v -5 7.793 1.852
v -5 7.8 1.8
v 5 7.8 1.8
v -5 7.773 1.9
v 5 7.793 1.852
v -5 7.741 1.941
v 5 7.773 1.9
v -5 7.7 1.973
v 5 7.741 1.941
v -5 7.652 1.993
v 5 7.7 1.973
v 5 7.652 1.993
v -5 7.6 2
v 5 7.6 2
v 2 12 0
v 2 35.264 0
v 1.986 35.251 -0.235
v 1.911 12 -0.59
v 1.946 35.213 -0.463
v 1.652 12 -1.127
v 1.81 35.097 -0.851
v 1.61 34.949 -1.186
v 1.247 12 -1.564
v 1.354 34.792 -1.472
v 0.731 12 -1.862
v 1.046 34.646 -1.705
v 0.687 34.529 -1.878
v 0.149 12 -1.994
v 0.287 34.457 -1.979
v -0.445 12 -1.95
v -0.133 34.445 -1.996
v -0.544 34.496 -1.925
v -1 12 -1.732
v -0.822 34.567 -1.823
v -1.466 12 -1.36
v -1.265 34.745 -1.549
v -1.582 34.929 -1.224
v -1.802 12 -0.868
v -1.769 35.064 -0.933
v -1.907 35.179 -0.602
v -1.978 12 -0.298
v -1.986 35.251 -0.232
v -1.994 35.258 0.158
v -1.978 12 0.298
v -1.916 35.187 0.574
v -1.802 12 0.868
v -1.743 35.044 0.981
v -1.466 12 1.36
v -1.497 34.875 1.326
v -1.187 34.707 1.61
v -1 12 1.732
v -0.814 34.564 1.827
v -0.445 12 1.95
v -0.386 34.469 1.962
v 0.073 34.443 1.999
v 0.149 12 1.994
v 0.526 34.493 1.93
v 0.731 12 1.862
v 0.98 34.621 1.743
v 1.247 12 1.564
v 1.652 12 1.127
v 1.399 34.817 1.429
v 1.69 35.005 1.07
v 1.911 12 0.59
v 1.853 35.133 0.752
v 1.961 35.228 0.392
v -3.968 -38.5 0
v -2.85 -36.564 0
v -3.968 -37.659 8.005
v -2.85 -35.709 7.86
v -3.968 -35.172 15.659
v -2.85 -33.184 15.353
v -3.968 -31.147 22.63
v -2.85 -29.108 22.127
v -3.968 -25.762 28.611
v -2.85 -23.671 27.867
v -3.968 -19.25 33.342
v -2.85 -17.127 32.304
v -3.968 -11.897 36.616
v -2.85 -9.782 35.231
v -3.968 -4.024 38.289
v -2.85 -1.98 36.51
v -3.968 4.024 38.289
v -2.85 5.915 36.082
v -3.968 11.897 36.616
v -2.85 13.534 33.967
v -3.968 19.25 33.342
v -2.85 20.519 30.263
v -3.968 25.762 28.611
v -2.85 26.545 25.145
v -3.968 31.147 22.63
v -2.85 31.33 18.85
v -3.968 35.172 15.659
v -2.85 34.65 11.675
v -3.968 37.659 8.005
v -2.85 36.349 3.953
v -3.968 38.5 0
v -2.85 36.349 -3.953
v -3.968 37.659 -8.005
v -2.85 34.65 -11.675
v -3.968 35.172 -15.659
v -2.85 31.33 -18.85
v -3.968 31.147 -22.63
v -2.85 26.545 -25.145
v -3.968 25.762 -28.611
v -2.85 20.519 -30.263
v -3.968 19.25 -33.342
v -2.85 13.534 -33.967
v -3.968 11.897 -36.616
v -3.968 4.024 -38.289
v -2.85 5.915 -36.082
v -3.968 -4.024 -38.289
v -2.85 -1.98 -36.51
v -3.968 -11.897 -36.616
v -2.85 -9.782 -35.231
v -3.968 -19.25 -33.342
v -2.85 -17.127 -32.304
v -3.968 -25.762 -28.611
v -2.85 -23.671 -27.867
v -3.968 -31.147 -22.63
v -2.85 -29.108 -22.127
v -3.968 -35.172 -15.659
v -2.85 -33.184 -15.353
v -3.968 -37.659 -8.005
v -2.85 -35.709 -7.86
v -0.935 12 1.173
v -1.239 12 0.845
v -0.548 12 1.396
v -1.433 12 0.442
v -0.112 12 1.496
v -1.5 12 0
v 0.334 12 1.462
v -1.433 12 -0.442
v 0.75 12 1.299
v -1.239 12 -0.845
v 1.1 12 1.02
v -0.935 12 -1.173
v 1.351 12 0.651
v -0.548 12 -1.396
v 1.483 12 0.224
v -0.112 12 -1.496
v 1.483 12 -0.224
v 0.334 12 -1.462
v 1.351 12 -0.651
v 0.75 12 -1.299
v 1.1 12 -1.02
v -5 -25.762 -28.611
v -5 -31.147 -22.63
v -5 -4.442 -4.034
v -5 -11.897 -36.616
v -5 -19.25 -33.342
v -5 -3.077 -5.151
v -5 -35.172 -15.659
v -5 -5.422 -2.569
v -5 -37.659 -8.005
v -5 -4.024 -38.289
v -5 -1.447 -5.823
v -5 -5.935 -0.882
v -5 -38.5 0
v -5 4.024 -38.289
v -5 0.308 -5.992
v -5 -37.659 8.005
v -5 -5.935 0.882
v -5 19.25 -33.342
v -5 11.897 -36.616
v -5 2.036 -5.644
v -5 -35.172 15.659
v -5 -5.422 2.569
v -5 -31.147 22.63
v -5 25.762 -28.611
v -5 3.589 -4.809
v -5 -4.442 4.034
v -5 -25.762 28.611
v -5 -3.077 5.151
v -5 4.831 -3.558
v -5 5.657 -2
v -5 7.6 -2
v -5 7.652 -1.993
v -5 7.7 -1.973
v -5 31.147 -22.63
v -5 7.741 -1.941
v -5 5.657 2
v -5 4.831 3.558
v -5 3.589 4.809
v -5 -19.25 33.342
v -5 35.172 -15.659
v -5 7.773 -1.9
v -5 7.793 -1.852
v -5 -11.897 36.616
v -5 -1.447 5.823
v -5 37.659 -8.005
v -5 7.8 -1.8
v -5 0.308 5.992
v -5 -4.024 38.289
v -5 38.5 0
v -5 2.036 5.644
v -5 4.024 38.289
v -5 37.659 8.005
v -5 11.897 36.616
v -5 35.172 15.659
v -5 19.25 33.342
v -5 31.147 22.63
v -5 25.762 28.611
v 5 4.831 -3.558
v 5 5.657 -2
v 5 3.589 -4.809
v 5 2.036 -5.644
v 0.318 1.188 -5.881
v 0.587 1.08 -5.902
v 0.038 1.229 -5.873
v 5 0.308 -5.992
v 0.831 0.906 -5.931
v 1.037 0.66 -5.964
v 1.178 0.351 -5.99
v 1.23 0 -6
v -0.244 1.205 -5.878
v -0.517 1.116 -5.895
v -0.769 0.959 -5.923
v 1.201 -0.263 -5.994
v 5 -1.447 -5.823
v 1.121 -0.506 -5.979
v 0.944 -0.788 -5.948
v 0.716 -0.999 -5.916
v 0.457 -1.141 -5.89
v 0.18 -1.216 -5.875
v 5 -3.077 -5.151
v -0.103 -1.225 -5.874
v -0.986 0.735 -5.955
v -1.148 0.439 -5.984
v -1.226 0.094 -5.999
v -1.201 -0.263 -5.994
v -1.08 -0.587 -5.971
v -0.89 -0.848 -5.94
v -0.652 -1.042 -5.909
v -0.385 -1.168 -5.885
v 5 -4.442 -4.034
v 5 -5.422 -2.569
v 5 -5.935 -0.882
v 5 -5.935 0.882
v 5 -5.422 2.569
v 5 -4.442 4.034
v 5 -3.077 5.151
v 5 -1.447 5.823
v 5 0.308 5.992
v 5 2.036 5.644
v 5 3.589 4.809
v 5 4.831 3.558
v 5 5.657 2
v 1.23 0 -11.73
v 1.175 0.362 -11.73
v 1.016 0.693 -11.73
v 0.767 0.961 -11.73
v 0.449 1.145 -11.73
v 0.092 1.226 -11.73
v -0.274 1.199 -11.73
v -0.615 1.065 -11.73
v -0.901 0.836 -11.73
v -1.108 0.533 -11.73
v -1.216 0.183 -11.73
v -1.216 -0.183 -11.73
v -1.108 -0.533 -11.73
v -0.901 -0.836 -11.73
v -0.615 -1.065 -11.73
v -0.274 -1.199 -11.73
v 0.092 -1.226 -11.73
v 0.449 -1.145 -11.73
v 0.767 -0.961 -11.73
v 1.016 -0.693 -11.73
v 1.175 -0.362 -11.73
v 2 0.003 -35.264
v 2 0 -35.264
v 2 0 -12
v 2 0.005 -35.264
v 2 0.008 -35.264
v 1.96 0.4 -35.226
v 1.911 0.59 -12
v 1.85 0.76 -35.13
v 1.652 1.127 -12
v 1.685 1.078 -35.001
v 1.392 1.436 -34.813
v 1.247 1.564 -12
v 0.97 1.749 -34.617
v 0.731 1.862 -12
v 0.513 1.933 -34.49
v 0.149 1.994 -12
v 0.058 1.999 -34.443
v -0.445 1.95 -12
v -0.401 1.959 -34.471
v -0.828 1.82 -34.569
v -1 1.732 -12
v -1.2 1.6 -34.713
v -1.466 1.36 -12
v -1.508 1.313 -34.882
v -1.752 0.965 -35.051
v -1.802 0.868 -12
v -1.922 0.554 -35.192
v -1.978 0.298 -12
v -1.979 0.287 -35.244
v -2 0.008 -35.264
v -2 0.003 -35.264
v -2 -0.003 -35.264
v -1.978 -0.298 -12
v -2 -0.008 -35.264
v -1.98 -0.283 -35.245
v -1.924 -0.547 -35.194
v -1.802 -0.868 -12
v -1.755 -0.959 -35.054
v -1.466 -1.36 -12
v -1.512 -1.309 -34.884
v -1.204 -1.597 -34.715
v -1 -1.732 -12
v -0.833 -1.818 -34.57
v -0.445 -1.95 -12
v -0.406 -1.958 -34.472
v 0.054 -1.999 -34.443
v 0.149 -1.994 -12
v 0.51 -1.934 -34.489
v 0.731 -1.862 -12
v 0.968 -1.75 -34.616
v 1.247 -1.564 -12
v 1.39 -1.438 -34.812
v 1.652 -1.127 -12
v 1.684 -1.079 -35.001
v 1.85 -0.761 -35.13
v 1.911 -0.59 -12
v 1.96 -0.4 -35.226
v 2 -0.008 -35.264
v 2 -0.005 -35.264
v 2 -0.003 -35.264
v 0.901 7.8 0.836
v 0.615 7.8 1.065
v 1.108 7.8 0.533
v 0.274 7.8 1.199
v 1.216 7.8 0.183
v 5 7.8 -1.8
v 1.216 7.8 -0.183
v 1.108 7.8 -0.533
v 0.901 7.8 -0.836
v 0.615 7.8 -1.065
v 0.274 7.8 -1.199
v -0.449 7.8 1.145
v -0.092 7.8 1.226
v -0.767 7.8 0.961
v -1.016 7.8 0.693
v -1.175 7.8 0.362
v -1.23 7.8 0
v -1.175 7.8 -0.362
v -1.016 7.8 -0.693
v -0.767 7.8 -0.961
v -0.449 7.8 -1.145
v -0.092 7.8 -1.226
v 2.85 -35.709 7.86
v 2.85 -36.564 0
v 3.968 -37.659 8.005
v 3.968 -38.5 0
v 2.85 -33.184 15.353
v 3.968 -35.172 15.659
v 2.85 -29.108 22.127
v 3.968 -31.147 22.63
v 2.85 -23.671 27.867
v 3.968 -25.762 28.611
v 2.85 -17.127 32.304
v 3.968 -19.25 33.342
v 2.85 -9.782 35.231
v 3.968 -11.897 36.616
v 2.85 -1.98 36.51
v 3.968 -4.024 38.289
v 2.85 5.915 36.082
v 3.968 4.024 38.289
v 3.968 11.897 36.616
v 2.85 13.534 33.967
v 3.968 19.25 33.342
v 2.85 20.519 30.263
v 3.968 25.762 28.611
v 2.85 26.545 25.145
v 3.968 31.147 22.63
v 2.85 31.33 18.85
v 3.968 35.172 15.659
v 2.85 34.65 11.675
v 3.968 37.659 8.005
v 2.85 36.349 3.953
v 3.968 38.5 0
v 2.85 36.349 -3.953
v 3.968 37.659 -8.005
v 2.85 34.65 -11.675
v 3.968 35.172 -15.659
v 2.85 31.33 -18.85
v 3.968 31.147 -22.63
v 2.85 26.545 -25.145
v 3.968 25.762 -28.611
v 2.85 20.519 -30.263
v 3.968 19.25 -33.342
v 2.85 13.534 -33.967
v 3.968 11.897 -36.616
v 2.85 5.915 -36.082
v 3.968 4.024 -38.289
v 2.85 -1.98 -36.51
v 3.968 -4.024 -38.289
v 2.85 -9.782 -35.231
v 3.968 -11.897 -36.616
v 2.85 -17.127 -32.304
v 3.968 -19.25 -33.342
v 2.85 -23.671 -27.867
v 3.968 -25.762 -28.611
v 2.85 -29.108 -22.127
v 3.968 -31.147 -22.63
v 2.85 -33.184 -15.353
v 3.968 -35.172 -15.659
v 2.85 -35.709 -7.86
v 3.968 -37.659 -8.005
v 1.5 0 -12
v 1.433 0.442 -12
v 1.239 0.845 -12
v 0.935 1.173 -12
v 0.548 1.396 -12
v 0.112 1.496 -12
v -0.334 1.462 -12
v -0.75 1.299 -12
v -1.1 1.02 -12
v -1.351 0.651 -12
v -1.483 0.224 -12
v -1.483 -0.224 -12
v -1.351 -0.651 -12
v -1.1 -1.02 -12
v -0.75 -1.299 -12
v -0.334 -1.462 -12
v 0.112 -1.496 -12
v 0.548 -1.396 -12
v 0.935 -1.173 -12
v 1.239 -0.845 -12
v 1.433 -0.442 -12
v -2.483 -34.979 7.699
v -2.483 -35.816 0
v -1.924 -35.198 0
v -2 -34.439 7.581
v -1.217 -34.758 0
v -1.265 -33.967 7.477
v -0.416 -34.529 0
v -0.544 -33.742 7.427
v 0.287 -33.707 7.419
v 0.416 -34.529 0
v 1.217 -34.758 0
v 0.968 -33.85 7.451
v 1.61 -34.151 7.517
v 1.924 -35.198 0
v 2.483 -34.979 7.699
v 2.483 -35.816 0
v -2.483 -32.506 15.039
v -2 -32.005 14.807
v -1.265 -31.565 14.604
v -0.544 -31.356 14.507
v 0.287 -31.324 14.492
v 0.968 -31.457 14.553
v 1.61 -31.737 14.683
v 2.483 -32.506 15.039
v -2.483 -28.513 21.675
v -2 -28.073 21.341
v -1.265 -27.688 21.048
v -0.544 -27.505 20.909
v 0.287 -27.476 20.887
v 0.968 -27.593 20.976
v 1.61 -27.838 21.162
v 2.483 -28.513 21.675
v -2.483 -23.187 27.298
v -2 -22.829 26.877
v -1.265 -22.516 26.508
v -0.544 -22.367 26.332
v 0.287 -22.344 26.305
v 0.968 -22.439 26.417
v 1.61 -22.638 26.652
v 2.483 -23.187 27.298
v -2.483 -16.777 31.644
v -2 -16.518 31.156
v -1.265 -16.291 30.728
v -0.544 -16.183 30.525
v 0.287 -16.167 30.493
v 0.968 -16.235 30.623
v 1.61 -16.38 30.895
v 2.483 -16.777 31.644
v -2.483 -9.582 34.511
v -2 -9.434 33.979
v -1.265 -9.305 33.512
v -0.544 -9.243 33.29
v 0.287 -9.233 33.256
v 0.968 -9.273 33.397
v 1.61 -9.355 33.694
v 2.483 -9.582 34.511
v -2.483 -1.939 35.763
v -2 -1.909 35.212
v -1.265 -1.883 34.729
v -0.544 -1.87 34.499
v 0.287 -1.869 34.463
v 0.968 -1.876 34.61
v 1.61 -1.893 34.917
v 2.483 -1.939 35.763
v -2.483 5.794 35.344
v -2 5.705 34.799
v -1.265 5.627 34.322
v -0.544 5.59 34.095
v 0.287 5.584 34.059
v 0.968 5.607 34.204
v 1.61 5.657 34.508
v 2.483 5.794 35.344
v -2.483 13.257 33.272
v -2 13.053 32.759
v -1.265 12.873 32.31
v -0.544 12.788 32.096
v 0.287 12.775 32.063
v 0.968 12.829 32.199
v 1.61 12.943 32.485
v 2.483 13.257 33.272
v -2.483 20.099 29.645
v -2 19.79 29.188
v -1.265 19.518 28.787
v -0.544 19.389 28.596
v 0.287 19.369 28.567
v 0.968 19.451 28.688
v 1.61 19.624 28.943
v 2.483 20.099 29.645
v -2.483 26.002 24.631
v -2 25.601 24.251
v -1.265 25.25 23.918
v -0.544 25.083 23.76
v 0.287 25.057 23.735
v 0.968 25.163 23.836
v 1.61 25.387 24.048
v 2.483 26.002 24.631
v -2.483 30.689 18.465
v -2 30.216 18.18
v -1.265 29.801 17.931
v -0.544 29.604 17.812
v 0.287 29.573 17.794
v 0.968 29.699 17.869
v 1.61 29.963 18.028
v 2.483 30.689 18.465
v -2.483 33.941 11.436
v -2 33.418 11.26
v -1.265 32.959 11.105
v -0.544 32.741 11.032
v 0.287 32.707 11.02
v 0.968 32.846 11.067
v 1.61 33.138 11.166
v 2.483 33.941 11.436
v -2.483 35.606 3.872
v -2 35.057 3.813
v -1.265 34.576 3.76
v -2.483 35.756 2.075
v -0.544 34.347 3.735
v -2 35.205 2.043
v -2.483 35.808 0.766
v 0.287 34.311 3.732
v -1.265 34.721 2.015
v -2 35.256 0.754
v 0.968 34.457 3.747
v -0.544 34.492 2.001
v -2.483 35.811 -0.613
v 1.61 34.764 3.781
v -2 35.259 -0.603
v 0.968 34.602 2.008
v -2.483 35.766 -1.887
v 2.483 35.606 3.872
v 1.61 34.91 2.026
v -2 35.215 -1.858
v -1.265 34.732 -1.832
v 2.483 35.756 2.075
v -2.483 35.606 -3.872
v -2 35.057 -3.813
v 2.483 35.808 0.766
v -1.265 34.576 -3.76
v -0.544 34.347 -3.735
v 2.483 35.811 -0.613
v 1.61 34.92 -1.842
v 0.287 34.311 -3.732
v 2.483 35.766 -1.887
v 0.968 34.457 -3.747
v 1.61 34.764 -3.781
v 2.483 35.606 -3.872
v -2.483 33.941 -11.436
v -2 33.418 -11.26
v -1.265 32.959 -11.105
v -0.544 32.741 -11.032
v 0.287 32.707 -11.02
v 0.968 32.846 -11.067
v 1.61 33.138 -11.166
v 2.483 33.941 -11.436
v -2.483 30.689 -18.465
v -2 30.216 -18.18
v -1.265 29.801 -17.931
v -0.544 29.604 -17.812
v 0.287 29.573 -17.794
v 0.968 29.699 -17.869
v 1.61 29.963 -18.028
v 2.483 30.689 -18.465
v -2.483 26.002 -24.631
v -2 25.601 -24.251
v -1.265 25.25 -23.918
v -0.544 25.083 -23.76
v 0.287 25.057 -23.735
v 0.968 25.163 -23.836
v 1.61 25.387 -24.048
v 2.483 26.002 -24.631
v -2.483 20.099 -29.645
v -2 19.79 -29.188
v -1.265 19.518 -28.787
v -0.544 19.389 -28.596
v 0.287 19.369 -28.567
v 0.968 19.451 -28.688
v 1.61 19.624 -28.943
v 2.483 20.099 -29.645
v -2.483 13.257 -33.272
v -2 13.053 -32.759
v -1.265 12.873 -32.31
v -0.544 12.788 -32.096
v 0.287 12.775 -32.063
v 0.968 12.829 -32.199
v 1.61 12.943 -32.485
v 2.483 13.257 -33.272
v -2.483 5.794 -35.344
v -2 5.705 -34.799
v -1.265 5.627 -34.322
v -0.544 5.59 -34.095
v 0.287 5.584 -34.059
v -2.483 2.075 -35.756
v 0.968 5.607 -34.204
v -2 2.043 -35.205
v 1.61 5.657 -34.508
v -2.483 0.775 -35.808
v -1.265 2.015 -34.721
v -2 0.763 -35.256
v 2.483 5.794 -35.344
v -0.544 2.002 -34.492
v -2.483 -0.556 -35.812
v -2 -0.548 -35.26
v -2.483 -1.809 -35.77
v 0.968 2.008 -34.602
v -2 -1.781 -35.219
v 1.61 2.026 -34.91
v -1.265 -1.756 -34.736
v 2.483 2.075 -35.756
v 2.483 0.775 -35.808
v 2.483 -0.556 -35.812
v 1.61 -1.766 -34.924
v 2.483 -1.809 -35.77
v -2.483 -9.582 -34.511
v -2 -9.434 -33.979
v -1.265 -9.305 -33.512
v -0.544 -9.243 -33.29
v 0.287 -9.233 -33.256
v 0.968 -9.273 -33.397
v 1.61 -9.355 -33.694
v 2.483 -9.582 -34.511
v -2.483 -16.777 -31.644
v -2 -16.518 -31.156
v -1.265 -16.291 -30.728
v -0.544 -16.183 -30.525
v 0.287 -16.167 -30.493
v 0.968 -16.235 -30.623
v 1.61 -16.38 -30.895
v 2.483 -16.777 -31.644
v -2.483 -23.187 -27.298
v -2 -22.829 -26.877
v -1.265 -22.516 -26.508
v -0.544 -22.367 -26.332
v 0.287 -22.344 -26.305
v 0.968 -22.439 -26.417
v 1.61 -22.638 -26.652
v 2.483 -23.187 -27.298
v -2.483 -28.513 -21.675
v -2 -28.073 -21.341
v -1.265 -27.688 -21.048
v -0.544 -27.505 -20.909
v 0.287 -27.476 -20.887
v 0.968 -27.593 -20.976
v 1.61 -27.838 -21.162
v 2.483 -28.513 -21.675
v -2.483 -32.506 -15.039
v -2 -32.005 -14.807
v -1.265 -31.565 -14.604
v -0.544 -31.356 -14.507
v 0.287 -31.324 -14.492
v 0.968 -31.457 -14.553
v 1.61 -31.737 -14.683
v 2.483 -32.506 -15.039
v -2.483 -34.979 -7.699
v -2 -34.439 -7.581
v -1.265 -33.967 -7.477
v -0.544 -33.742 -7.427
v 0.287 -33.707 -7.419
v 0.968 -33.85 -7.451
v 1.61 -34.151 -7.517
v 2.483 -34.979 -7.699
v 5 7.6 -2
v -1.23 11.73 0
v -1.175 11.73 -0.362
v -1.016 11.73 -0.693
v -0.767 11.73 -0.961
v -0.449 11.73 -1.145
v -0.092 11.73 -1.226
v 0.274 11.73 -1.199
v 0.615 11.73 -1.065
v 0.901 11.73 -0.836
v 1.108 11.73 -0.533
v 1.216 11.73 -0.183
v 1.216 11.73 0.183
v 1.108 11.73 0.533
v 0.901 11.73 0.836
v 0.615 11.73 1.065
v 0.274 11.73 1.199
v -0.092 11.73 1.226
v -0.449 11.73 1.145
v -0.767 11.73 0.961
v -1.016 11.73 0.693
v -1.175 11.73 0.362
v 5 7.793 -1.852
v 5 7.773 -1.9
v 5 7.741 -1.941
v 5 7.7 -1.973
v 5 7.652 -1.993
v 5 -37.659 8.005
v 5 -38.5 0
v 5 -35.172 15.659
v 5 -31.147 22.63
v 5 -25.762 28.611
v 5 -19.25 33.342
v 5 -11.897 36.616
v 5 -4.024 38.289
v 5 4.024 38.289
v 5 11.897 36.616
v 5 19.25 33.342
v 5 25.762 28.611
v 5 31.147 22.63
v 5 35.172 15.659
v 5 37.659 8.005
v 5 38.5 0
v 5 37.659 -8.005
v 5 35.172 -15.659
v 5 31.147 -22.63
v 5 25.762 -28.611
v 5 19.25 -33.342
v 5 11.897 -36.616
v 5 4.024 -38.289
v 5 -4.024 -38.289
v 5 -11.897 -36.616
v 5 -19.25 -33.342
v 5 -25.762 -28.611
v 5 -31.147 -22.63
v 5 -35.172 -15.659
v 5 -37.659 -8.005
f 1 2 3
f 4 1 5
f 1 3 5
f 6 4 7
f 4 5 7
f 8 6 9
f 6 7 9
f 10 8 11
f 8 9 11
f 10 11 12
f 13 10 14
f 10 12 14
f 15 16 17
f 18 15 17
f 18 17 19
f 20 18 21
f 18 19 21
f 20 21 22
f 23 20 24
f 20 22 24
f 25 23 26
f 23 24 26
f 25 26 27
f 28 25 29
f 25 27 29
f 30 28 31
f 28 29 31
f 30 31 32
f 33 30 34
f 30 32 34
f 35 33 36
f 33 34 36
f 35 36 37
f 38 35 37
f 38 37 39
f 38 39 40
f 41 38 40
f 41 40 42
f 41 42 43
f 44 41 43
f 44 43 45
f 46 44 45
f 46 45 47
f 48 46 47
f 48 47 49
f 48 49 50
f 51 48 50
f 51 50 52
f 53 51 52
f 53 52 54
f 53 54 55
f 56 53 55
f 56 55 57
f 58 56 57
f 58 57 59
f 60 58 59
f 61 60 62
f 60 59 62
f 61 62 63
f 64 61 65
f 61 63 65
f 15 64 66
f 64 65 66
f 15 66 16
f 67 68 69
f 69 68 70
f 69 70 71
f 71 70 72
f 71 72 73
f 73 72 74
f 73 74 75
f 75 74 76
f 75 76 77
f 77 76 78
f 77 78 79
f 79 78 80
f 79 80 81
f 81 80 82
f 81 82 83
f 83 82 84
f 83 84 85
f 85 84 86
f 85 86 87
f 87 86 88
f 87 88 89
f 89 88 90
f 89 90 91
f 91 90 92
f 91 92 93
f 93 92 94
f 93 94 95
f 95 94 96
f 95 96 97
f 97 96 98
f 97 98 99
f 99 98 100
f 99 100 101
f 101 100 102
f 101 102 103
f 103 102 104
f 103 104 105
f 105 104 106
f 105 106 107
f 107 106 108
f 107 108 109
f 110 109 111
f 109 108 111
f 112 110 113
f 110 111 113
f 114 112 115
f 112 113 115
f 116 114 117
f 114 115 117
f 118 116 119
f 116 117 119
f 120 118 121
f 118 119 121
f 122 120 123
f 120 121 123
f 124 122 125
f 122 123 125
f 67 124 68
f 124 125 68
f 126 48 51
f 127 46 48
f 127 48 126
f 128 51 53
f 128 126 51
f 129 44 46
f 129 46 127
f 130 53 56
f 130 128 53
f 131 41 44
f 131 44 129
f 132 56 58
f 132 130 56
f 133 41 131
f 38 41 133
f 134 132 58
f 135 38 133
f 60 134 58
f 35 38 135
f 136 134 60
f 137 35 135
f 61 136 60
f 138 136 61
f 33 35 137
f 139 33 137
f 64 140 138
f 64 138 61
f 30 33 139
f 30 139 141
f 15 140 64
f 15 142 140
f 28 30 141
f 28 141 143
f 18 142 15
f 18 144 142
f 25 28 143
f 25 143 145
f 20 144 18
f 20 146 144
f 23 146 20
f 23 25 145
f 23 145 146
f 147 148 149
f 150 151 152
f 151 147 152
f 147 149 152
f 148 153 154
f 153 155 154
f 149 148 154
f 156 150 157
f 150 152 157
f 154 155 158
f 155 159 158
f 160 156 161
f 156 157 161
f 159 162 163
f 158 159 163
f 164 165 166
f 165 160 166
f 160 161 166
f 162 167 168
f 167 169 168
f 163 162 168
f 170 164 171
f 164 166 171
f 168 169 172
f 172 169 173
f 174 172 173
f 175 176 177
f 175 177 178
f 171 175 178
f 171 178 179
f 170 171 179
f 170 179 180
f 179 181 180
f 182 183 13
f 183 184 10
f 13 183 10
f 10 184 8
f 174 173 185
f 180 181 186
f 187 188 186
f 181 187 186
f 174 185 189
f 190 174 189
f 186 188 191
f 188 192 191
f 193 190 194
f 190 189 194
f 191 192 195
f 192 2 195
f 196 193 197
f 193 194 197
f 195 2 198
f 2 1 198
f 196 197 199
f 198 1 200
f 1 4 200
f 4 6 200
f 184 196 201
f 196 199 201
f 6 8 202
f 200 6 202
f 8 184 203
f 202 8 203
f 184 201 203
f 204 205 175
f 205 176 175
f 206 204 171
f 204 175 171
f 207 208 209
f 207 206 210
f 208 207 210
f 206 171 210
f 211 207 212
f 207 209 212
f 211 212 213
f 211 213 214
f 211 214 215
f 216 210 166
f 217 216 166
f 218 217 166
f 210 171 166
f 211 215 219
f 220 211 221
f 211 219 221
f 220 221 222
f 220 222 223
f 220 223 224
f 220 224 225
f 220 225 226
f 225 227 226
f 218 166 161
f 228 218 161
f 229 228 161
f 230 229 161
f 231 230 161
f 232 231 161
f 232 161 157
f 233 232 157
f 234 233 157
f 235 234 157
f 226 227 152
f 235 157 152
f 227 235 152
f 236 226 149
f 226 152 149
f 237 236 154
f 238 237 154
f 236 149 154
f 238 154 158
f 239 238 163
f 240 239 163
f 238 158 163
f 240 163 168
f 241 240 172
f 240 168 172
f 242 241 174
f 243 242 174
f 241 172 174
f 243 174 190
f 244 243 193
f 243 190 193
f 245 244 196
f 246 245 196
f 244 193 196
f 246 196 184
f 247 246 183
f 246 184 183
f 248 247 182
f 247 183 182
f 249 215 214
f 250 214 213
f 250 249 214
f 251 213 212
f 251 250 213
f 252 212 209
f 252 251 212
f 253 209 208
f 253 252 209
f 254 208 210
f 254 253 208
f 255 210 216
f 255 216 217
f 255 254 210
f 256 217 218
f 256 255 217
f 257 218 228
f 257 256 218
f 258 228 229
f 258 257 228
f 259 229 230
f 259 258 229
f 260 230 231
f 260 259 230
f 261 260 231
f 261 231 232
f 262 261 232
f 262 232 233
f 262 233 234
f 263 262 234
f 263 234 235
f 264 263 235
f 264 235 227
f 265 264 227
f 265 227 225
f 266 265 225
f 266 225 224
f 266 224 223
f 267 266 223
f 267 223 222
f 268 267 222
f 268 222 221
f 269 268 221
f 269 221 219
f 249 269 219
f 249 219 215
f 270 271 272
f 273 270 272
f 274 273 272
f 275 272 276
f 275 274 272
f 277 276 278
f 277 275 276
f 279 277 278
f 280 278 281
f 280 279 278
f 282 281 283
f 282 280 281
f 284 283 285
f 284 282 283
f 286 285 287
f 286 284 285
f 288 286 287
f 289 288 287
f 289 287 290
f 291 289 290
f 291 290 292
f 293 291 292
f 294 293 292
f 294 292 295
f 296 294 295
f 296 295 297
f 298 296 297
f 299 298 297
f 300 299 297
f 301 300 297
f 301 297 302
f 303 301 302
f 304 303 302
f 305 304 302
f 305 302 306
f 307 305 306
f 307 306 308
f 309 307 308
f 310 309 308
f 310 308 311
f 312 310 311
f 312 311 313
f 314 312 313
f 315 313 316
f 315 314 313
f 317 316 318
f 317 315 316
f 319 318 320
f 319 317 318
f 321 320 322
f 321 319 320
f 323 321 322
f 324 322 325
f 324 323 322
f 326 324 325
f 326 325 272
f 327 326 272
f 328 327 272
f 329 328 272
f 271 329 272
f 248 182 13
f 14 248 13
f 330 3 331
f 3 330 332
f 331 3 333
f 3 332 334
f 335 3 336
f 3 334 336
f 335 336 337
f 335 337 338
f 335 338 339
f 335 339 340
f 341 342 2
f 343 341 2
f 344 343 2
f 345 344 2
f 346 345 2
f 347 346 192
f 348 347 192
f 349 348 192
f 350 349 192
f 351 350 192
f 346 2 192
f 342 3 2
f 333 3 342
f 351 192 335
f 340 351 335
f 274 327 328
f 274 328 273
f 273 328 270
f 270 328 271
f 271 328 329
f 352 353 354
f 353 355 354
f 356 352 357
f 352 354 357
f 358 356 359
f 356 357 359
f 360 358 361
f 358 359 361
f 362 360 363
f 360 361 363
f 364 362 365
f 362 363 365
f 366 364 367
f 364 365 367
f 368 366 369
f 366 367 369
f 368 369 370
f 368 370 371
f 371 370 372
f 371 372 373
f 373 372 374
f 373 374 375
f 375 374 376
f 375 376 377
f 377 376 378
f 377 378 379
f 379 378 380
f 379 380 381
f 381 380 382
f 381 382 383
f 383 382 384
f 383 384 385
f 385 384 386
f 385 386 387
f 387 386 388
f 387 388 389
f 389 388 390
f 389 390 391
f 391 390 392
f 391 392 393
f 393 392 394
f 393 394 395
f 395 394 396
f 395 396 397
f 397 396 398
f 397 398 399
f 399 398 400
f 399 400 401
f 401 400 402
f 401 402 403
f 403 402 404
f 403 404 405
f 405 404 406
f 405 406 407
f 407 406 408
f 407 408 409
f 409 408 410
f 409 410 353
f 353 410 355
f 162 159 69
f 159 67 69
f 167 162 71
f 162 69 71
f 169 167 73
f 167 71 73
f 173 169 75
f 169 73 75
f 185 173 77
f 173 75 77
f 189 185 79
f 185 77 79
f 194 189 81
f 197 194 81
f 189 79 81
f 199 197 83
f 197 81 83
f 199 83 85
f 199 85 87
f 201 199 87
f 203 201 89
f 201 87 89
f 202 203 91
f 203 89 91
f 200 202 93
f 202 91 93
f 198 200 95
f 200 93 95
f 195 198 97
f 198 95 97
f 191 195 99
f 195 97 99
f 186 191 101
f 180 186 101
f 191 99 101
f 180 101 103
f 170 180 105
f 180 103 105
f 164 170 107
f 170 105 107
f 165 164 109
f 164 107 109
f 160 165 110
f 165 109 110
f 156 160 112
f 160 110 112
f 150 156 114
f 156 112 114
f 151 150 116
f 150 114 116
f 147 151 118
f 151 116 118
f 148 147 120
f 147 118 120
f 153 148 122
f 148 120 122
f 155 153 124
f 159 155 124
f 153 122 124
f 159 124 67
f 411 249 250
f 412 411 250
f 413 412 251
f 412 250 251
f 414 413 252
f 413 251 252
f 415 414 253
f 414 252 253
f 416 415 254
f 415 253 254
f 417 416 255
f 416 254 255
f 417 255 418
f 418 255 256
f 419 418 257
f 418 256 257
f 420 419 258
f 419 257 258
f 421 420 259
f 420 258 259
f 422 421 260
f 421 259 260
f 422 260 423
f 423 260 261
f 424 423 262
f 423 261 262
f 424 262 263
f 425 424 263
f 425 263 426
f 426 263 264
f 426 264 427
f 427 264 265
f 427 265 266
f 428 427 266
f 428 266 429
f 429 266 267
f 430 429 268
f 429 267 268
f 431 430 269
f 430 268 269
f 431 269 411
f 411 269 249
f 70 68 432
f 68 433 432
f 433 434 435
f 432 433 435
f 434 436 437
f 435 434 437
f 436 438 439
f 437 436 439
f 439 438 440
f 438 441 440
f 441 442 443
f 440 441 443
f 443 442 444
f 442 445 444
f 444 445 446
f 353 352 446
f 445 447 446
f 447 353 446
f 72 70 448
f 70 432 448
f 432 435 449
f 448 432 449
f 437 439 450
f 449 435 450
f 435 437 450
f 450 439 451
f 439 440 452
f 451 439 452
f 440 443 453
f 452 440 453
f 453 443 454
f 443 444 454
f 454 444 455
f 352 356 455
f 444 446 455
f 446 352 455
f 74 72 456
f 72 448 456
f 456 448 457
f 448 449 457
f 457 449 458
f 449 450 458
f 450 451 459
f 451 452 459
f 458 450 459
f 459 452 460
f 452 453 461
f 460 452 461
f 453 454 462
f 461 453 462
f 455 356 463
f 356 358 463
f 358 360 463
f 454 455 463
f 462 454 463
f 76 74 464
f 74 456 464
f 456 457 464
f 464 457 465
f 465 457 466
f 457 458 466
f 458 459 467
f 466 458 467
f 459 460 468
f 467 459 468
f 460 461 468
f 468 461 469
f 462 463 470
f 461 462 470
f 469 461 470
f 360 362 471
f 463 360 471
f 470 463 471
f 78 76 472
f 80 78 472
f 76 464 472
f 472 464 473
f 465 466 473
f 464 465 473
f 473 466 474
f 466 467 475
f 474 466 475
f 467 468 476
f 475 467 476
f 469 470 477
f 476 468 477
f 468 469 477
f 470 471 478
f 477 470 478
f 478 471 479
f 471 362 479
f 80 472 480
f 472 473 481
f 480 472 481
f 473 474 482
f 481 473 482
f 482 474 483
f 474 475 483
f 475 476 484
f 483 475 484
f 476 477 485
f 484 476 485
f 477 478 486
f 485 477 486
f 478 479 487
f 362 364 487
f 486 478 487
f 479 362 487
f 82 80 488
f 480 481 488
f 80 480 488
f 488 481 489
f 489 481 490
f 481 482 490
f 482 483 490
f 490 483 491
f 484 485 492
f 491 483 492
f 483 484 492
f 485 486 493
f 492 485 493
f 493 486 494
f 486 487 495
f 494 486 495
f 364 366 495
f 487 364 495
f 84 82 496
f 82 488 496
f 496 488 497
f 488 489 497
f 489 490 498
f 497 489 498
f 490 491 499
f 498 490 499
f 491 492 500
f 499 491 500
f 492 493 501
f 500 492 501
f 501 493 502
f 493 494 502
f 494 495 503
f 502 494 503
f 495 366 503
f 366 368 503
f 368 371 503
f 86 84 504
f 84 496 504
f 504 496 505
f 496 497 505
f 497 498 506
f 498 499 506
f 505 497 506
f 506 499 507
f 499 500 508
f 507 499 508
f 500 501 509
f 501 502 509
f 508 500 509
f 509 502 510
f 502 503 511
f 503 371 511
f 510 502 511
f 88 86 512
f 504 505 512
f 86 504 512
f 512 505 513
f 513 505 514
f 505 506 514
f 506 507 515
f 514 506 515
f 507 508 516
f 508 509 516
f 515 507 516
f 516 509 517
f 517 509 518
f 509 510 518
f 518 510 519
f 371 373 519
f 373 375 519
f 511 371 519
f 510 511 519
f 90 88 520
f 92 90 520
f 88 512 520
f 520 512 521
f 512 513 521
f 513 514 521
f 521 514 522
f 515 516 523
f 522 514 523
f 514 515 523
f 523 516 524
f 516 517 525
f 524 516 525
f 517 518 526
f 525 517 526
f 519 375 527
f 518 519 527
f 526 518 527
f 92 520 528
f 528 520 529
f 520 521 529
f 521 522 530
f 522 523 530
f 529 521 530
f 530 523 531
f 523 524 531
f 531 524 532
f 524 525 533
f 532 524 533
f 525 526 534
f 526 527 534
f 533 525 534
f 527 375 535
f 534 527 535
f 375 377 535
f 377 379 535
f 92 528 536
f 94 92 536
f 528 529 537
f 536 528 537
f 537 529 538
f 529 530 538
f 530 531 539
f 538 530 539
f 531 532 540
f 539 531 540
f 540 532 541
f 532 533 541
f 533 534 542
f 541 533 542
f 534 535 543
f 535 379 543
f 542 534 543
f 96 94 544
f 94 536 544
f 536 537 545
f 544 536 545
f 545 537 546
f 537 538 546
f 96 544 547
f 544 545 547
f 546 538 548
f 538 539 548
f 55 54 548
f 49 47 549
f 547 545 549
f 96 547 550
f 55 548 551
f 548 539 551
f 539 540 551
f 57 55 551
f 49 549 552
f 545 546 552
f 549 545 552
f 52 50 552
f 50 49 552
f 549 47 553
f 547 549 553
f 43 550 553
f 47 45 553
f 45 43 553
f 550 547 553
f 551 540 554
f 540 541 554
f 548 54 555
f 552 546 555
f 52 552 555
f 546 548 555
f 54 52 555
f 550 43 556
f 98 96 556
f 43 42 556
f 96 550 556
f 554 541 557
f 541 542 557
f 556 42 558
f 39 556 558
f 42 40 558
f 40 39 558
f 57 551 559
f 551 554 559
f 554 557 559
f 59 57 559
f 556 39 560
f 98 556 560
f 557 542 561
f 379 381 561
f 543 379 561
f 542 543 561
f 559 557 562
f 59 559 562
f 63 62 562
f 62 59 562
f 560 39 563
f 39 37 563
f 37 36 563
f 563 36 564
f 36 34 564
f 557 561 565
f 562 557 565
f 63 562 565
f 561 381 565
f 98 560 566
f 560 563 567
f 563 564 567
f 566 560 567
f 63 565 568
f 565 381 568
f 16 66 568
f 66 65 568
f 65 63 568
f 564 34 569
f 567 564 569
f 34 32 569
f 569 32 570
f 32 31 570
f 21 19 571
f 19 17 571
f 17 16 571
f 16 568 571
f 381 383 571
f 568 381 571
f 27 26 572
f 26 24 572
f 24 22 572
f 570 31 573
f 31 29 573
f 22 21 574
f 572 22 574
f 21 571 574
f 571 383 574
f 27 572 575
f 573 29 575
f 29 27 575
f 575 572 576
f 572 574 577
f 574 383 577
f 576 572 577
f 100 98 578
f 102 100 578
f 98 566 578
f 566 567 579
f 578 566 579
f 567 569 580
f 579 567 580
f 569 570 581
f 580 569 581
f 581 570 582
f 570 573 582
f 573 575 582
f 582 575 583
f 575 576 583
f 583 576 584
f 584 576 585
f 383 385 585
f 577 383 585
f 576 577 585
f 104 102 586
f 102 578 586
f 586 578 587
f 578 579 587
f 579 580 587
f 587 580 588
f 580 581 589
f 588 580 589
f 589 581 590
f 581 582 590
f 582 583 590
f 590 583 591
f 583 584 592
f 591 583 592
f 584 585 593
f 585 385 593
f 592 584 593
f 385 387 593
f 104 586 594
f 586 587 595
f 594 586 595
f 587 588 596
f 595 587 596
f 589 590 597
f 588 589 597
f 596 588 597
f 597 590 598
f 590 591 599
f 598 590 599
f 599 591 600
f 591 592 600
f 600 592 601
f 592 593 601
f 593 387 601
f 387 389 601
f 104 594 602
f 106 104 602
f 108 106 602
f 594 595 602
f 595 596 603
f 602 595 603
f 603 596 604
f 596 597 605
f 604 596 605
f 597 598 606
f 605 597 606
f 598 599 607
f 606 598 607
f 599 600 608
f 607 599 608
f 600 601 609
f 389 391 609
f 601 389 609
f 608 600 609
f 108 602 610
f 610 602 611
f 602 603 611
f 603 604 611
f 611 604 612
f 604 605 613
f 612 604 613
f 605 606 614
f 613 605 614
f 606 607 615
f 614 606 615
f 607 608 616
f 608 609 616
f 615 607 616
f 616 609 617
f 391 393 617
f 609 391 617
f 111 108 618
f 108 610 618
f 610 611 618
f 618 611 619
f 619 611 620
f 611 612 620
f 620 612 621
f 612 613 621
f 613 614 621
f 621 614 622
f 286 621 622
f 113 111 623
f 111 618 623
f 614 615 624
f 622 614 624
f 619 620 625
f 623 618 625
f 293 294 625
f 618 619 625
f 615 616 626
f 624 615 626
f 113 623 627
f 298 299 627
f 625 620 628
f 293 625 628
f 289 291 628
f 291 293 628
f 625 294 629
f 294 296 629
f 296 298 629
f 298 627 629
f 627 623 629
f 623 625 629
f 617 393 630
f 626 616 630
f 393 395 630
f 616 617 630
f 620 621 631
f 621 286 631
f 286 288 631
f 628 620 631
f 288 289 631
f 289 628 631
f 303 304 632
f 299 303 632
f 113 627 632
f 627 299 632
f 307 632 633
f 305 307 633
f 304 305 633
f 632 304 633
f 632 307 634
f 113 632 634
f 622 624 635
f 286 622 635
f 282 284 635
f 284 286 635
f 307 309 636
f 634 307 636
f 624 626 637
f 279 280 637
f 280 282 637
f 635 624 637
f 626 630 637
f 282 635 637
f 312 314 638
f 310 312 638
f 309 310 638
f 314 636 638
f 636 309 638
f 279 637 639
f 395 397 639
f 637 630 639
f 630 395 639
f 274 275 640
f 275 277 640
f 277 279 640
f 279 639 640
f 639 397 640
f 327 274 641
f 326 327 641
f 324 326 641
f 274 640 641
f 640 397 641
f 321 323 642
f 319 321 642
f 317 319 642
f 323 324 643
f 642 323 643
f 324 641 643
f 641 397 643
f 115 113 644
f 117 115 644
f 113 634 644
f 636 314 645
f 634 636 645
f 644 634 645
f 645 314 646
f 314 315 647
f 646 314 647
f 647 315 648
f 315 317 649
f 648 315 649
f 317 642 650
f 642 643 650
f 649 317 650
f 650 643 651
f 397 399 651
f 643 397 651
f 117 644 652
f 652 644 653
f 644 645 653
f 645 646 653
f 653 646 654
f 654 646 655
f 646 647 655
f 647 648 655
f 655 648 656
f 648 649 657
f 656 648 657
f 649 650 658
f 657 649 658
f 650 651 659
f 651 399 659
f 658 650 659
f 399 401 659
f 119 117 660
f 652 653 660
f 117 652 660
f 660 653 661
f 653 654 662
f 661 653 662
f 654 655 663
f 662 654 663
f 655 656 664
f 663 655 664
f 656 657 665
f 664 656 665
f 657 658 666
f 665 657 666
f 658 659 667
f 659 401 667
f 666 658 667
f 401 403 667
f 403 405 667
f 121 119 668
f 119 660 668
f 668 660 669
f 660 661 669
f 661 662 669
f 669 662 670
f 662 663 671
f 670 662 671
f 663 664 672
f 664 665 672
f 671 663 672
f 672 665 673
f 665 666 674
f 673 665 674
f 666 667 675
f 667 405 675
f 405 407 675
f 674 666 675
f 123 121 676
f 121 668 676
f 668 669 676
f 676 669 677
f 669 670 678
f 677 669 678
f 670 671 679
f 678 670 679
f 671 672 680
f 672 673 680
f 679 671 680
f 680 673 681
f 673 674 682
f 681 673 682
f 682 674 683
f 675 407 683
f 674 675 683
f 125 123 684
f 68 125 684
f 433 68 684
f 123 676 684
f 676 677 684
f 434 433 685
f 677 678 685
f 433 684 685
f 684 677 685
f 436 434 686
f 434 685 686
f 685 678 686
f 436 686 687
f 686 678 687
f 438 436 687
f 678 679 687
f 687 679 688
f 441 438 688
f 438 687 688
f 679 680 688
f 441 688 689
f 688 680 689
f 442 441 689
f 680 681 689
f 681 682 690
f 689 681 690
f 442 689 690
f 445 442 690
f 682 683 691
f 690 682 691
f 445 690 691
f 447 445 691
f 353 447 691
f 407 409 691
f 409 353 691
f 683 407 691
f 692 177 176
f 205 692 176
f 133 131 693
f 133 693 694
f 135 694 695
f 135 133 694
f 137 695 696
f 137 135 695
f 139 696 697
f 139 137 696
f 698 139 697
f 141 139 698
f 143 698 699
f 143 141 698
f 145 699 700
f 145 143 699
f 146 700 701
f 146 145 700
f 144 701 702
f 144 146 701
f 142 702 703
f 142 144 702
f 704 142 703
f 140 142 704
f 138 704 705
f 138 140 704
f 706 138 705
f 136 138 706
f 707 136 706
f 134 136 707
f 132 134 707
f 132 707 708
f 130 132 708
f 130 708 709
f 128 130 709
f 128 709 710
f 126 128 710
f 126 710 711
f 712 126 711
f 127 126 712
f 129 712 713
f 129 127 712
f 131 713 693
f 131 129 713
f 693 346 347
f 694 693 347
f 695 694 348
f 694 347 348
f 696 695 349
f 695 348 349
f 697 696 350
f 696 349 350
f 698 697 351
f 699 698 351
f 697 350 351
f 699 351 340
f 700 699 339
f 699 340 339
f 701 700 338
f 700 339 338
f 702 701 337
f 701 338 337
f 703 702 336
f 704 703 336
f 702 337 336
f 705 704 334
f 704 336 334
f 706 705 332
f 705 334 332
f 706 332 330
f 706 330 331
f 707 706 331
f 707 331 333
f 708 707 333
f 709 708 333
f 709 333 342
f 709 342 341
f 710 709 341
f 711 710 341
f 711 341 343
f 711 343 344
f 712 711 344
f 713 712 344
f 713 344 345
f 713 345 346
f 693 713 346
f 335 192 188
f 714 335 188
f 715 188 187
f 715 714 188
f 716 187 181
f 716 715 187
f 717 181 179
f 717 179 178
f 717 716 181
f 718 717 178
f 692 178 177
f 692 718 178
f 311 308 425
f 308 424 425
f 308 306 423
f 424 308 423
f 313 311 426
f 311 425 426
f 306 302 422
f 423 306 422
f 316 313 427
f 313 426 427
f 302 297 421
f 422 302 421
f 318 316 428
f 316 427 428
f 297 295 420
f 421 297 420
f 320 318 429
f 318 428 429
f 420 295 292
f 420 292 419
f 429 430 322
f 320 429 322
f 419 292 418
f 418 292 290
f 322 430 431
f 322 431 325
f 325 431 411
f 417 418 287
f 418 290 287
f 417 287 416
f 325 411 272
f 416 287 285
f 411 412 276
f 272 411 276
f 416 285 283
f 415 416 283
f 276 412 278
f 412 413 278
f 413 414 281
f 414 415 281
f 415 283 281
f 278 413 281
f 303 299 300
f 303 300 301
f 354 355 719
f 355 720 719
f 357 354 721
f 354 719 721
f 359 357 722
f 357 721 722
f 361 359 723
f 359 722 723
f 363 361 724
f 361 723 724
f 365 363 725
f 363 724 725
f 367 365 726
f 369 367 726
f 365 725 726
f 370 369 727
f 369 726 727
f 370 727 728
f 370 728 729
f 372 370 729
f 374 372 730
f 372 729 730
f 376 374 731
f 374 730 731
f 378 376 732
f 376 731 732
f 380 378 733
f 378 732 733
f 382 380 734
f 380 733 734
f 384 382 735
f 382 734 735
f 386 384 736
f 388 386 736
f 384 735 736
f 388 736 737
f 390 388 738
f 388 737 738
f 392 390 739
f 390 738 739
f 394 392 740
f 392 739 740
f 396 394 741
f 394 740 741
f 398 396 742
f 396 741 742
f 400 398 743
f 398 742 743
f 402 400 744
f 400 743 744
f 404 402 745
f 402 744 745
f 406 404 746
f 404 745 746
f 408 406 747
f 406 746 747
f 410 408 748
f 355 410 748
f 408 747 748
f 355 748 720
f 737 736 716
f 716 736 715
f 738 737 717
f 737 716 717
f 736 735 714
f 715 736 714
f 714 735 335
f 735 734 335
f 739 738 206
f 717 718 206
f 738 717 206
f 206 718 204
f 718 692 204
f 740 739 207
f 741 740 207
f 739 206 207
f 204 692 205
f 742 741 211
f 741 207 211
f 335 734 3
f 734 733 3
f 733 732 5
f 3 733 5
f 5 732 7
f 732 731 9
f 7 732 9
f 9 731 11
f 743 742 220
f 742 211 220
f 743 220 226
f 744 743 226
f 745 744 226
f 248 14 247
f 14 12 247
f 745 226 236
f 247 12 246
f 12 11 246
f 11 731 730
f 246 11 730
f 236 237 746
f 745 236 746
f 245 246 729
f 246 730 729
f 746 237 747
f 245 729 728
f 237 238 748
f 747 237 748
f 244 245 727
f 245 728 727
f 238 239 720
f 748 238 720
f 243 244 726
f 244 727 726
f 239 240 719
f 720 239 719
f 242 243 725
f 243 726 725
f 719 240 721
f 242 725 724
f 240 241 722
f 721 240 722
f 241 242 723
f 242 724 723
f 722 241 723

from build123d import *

# Parameters (mm, degrees)
CUT_EXTRUDE1_DEPTH                               = 56.357926262
SKETCH3_W                                        = 10
SKETCH3_H                                        = 6
CBORE_START                                      = -35.263917504
CBORE_FOR_M2_HEX_HEAD_MACHINE_SCREW1_OUT_R       = 2
CBORE_FOR_M2_HEX_HEAD_MACHINE_SCREW1_DEPTH       = 23.263917504
CBORE_START_2                                    = -12
CBORE_FOR_M2_HEX_HEAD_MACHINE_SCREW1_2_O_R       = 1.2295
CBORE_FOR_M2_HEX_HEAD_MACHINE_SCREW1_2_DEPTH     = 6.12732314
CBORE_FOR_M2_HEX_HEAD_MACHINE_SCREW2_D           = 2.459
CBORE_FOR_M2_HEX_HEAD_MACHINE_SCREW2_DEPTH       = 27.463932023
CBORE_FOR_M2_HEX_HEAD_MACHINE_SCREW2_CBORE_D     = 4
CBORE_FOR_M2_HEX_HEAD_MACHINE_SCREW2_CBORE_DEPTH = 23.263932023
CHAMFER1_SIZE                                    = 0.2705
FILLET1_R                                        = 0.2


# Read off the part's stored shape, not the designer's step: CBORE for M2 Hex Head Machine Screw1
with BuildPart() as part:
    # Sketch1 → Revolve1 (revolve)
    with BuildSketch(Plane(origin=(0, 0, 0), x_dir=(-1, 0, 0), z_dir=(0, 0, -1)), mode=Mode.PRIVATE) as revolve1_sk:
        with BuildLine():
            Line((-5, 38.5), (-5, 0))
            Line((-5, 0), (5, 0))
            Line((5, 0), (5, 38.5))
            Line((5, 38.5), (3.968118785, 38.5))
            Line((3.968118785, 38.5), (2.850084796, 36.563508327))
            ThreePointArc((2.850084796, 36.563508327), (0, 34.5), (-2.850084796, 36.563508327))
            Line((-2.850084796, 36.563508327), (-3.968118785, 38.5))
            Line((-3.968118785, 38.5), (-5, 38.5))
        make_face()
    revolve(revolve1_sk.sketch.rotate(Axis((5, 0, 0), (-1, 0, 0)), 180), axis=Axis((5, 0, 0), (-1, 0, 0)))

    # Sketch2 → Cut-Extrude1 (cut, through all)
    with BuildSketch(Plane.ZY.offset(5)):
        with BuildLine():
            Line((2, 5.656854249), (2, 7.8))
            Line((2, 7.8), (-2, 7.8))
            Line((-2, 7.8), (-2, 5.656854249))
            ThreePointArc((-2, 5.656854249), (0, 6), (2, 5.656854249))
        make_face()
    extrude(amount=-CUT_EXTRUDE1_DEPTH, mode=Mode.SUBTRACT)

    # Sketch3 → Cut-Revolve1 (revolve, cut)
    with BuildSketch(Plane(origin=(0, 0, 0), x_dir=(-1, 0, 0), z_dir=(0, 0, -1)), mode=Mode.PRIVATE) as cut_revolve1_sk:
        with Locations((0, 3)):
            Rectangle(SKETCH3_W, SKETCH3_H)
    revolve(cut_revolve1_sk.sketch.rotate(Axis((5, 0, 0), (-1, 0, 0)), 180), axis=Axis((5, 0, 0), (-1, 0, 0)), mode=Mode.SUBTRACT)

    # CBORE for M2 Hex Head Machine Screw1 out → CBORE for M2 Hex Head Machine Screw1 (cut)
    with BuildSketch(Plane.XY.offset(CBORE_START)):
        Circle(CBORE_FOR_M2_HEX_HEAD_MACHINE_SCREW1_OUT_R)
    extrude(amount=CBORE_FOR_M2_HEX_HEAD_MACHINE_SCREW1_DEPTH, mode=Mode.SUBTRACT)

    # CBORE for M2 Hex Head Machine Screw1 2 o → CBORE for M2 Hex Head Machine Screw1 2 (cut)
    with BuildSketch(Plane.XY.offset(CBORE_START_2)):
        Circle(CBORE_FOR_M2_HEX_HEAD_MACHINE_SCREW1_2_O_R)
    extrude(amount=CBORE_FOR_M2_HEX_HEAD_MACHINE_SCREW1_2_DEPTH, mode=Mode.SUBTRACT)

    # CBORE for M2 Hex Head Machine Screw2
    with Locations(Plane(origin=(0, 35.263932023, 0), x_dir=(1, 0, 0), z_dir=(0, 1, 0))):
        with Locations((0, 0)):
            CounterBoreHole(CBORE_FOR_M2_HEX_HEAD_MACHINE_SCREW2_D / 2, CBORE_FOR_M2_HEX_HEAD_MACHINE_SCREW2_CBORE_D / 2, CBORE_FOR_M2_HEX_HEAD_MACHINE_SCREW2_CBORE_DEPTH, depth=CBORE_FOR_M2_HEX_HEAD_MACHINE_SCREW2_DEPTH)

    # Chamfer1
    chamfer1_edges = [part.edges().sort_by_distance(p)[0] for p in [
        (-1.2295, 0, -12),
        (1.2295, 12, 0),
    ]]
    chamfer(chamfer1_edges, length=CHAMFER1_SIZE)

    # Fillet1
    fillet1_edges = [part.edges().sort_by_distance(p)[0] for p in [
        (0, 7.8, -2),
        (0, 7.8, 2),
    ]]
    fillet(fillet1_edges, radius=FILLET1_R)


solid = part.part
